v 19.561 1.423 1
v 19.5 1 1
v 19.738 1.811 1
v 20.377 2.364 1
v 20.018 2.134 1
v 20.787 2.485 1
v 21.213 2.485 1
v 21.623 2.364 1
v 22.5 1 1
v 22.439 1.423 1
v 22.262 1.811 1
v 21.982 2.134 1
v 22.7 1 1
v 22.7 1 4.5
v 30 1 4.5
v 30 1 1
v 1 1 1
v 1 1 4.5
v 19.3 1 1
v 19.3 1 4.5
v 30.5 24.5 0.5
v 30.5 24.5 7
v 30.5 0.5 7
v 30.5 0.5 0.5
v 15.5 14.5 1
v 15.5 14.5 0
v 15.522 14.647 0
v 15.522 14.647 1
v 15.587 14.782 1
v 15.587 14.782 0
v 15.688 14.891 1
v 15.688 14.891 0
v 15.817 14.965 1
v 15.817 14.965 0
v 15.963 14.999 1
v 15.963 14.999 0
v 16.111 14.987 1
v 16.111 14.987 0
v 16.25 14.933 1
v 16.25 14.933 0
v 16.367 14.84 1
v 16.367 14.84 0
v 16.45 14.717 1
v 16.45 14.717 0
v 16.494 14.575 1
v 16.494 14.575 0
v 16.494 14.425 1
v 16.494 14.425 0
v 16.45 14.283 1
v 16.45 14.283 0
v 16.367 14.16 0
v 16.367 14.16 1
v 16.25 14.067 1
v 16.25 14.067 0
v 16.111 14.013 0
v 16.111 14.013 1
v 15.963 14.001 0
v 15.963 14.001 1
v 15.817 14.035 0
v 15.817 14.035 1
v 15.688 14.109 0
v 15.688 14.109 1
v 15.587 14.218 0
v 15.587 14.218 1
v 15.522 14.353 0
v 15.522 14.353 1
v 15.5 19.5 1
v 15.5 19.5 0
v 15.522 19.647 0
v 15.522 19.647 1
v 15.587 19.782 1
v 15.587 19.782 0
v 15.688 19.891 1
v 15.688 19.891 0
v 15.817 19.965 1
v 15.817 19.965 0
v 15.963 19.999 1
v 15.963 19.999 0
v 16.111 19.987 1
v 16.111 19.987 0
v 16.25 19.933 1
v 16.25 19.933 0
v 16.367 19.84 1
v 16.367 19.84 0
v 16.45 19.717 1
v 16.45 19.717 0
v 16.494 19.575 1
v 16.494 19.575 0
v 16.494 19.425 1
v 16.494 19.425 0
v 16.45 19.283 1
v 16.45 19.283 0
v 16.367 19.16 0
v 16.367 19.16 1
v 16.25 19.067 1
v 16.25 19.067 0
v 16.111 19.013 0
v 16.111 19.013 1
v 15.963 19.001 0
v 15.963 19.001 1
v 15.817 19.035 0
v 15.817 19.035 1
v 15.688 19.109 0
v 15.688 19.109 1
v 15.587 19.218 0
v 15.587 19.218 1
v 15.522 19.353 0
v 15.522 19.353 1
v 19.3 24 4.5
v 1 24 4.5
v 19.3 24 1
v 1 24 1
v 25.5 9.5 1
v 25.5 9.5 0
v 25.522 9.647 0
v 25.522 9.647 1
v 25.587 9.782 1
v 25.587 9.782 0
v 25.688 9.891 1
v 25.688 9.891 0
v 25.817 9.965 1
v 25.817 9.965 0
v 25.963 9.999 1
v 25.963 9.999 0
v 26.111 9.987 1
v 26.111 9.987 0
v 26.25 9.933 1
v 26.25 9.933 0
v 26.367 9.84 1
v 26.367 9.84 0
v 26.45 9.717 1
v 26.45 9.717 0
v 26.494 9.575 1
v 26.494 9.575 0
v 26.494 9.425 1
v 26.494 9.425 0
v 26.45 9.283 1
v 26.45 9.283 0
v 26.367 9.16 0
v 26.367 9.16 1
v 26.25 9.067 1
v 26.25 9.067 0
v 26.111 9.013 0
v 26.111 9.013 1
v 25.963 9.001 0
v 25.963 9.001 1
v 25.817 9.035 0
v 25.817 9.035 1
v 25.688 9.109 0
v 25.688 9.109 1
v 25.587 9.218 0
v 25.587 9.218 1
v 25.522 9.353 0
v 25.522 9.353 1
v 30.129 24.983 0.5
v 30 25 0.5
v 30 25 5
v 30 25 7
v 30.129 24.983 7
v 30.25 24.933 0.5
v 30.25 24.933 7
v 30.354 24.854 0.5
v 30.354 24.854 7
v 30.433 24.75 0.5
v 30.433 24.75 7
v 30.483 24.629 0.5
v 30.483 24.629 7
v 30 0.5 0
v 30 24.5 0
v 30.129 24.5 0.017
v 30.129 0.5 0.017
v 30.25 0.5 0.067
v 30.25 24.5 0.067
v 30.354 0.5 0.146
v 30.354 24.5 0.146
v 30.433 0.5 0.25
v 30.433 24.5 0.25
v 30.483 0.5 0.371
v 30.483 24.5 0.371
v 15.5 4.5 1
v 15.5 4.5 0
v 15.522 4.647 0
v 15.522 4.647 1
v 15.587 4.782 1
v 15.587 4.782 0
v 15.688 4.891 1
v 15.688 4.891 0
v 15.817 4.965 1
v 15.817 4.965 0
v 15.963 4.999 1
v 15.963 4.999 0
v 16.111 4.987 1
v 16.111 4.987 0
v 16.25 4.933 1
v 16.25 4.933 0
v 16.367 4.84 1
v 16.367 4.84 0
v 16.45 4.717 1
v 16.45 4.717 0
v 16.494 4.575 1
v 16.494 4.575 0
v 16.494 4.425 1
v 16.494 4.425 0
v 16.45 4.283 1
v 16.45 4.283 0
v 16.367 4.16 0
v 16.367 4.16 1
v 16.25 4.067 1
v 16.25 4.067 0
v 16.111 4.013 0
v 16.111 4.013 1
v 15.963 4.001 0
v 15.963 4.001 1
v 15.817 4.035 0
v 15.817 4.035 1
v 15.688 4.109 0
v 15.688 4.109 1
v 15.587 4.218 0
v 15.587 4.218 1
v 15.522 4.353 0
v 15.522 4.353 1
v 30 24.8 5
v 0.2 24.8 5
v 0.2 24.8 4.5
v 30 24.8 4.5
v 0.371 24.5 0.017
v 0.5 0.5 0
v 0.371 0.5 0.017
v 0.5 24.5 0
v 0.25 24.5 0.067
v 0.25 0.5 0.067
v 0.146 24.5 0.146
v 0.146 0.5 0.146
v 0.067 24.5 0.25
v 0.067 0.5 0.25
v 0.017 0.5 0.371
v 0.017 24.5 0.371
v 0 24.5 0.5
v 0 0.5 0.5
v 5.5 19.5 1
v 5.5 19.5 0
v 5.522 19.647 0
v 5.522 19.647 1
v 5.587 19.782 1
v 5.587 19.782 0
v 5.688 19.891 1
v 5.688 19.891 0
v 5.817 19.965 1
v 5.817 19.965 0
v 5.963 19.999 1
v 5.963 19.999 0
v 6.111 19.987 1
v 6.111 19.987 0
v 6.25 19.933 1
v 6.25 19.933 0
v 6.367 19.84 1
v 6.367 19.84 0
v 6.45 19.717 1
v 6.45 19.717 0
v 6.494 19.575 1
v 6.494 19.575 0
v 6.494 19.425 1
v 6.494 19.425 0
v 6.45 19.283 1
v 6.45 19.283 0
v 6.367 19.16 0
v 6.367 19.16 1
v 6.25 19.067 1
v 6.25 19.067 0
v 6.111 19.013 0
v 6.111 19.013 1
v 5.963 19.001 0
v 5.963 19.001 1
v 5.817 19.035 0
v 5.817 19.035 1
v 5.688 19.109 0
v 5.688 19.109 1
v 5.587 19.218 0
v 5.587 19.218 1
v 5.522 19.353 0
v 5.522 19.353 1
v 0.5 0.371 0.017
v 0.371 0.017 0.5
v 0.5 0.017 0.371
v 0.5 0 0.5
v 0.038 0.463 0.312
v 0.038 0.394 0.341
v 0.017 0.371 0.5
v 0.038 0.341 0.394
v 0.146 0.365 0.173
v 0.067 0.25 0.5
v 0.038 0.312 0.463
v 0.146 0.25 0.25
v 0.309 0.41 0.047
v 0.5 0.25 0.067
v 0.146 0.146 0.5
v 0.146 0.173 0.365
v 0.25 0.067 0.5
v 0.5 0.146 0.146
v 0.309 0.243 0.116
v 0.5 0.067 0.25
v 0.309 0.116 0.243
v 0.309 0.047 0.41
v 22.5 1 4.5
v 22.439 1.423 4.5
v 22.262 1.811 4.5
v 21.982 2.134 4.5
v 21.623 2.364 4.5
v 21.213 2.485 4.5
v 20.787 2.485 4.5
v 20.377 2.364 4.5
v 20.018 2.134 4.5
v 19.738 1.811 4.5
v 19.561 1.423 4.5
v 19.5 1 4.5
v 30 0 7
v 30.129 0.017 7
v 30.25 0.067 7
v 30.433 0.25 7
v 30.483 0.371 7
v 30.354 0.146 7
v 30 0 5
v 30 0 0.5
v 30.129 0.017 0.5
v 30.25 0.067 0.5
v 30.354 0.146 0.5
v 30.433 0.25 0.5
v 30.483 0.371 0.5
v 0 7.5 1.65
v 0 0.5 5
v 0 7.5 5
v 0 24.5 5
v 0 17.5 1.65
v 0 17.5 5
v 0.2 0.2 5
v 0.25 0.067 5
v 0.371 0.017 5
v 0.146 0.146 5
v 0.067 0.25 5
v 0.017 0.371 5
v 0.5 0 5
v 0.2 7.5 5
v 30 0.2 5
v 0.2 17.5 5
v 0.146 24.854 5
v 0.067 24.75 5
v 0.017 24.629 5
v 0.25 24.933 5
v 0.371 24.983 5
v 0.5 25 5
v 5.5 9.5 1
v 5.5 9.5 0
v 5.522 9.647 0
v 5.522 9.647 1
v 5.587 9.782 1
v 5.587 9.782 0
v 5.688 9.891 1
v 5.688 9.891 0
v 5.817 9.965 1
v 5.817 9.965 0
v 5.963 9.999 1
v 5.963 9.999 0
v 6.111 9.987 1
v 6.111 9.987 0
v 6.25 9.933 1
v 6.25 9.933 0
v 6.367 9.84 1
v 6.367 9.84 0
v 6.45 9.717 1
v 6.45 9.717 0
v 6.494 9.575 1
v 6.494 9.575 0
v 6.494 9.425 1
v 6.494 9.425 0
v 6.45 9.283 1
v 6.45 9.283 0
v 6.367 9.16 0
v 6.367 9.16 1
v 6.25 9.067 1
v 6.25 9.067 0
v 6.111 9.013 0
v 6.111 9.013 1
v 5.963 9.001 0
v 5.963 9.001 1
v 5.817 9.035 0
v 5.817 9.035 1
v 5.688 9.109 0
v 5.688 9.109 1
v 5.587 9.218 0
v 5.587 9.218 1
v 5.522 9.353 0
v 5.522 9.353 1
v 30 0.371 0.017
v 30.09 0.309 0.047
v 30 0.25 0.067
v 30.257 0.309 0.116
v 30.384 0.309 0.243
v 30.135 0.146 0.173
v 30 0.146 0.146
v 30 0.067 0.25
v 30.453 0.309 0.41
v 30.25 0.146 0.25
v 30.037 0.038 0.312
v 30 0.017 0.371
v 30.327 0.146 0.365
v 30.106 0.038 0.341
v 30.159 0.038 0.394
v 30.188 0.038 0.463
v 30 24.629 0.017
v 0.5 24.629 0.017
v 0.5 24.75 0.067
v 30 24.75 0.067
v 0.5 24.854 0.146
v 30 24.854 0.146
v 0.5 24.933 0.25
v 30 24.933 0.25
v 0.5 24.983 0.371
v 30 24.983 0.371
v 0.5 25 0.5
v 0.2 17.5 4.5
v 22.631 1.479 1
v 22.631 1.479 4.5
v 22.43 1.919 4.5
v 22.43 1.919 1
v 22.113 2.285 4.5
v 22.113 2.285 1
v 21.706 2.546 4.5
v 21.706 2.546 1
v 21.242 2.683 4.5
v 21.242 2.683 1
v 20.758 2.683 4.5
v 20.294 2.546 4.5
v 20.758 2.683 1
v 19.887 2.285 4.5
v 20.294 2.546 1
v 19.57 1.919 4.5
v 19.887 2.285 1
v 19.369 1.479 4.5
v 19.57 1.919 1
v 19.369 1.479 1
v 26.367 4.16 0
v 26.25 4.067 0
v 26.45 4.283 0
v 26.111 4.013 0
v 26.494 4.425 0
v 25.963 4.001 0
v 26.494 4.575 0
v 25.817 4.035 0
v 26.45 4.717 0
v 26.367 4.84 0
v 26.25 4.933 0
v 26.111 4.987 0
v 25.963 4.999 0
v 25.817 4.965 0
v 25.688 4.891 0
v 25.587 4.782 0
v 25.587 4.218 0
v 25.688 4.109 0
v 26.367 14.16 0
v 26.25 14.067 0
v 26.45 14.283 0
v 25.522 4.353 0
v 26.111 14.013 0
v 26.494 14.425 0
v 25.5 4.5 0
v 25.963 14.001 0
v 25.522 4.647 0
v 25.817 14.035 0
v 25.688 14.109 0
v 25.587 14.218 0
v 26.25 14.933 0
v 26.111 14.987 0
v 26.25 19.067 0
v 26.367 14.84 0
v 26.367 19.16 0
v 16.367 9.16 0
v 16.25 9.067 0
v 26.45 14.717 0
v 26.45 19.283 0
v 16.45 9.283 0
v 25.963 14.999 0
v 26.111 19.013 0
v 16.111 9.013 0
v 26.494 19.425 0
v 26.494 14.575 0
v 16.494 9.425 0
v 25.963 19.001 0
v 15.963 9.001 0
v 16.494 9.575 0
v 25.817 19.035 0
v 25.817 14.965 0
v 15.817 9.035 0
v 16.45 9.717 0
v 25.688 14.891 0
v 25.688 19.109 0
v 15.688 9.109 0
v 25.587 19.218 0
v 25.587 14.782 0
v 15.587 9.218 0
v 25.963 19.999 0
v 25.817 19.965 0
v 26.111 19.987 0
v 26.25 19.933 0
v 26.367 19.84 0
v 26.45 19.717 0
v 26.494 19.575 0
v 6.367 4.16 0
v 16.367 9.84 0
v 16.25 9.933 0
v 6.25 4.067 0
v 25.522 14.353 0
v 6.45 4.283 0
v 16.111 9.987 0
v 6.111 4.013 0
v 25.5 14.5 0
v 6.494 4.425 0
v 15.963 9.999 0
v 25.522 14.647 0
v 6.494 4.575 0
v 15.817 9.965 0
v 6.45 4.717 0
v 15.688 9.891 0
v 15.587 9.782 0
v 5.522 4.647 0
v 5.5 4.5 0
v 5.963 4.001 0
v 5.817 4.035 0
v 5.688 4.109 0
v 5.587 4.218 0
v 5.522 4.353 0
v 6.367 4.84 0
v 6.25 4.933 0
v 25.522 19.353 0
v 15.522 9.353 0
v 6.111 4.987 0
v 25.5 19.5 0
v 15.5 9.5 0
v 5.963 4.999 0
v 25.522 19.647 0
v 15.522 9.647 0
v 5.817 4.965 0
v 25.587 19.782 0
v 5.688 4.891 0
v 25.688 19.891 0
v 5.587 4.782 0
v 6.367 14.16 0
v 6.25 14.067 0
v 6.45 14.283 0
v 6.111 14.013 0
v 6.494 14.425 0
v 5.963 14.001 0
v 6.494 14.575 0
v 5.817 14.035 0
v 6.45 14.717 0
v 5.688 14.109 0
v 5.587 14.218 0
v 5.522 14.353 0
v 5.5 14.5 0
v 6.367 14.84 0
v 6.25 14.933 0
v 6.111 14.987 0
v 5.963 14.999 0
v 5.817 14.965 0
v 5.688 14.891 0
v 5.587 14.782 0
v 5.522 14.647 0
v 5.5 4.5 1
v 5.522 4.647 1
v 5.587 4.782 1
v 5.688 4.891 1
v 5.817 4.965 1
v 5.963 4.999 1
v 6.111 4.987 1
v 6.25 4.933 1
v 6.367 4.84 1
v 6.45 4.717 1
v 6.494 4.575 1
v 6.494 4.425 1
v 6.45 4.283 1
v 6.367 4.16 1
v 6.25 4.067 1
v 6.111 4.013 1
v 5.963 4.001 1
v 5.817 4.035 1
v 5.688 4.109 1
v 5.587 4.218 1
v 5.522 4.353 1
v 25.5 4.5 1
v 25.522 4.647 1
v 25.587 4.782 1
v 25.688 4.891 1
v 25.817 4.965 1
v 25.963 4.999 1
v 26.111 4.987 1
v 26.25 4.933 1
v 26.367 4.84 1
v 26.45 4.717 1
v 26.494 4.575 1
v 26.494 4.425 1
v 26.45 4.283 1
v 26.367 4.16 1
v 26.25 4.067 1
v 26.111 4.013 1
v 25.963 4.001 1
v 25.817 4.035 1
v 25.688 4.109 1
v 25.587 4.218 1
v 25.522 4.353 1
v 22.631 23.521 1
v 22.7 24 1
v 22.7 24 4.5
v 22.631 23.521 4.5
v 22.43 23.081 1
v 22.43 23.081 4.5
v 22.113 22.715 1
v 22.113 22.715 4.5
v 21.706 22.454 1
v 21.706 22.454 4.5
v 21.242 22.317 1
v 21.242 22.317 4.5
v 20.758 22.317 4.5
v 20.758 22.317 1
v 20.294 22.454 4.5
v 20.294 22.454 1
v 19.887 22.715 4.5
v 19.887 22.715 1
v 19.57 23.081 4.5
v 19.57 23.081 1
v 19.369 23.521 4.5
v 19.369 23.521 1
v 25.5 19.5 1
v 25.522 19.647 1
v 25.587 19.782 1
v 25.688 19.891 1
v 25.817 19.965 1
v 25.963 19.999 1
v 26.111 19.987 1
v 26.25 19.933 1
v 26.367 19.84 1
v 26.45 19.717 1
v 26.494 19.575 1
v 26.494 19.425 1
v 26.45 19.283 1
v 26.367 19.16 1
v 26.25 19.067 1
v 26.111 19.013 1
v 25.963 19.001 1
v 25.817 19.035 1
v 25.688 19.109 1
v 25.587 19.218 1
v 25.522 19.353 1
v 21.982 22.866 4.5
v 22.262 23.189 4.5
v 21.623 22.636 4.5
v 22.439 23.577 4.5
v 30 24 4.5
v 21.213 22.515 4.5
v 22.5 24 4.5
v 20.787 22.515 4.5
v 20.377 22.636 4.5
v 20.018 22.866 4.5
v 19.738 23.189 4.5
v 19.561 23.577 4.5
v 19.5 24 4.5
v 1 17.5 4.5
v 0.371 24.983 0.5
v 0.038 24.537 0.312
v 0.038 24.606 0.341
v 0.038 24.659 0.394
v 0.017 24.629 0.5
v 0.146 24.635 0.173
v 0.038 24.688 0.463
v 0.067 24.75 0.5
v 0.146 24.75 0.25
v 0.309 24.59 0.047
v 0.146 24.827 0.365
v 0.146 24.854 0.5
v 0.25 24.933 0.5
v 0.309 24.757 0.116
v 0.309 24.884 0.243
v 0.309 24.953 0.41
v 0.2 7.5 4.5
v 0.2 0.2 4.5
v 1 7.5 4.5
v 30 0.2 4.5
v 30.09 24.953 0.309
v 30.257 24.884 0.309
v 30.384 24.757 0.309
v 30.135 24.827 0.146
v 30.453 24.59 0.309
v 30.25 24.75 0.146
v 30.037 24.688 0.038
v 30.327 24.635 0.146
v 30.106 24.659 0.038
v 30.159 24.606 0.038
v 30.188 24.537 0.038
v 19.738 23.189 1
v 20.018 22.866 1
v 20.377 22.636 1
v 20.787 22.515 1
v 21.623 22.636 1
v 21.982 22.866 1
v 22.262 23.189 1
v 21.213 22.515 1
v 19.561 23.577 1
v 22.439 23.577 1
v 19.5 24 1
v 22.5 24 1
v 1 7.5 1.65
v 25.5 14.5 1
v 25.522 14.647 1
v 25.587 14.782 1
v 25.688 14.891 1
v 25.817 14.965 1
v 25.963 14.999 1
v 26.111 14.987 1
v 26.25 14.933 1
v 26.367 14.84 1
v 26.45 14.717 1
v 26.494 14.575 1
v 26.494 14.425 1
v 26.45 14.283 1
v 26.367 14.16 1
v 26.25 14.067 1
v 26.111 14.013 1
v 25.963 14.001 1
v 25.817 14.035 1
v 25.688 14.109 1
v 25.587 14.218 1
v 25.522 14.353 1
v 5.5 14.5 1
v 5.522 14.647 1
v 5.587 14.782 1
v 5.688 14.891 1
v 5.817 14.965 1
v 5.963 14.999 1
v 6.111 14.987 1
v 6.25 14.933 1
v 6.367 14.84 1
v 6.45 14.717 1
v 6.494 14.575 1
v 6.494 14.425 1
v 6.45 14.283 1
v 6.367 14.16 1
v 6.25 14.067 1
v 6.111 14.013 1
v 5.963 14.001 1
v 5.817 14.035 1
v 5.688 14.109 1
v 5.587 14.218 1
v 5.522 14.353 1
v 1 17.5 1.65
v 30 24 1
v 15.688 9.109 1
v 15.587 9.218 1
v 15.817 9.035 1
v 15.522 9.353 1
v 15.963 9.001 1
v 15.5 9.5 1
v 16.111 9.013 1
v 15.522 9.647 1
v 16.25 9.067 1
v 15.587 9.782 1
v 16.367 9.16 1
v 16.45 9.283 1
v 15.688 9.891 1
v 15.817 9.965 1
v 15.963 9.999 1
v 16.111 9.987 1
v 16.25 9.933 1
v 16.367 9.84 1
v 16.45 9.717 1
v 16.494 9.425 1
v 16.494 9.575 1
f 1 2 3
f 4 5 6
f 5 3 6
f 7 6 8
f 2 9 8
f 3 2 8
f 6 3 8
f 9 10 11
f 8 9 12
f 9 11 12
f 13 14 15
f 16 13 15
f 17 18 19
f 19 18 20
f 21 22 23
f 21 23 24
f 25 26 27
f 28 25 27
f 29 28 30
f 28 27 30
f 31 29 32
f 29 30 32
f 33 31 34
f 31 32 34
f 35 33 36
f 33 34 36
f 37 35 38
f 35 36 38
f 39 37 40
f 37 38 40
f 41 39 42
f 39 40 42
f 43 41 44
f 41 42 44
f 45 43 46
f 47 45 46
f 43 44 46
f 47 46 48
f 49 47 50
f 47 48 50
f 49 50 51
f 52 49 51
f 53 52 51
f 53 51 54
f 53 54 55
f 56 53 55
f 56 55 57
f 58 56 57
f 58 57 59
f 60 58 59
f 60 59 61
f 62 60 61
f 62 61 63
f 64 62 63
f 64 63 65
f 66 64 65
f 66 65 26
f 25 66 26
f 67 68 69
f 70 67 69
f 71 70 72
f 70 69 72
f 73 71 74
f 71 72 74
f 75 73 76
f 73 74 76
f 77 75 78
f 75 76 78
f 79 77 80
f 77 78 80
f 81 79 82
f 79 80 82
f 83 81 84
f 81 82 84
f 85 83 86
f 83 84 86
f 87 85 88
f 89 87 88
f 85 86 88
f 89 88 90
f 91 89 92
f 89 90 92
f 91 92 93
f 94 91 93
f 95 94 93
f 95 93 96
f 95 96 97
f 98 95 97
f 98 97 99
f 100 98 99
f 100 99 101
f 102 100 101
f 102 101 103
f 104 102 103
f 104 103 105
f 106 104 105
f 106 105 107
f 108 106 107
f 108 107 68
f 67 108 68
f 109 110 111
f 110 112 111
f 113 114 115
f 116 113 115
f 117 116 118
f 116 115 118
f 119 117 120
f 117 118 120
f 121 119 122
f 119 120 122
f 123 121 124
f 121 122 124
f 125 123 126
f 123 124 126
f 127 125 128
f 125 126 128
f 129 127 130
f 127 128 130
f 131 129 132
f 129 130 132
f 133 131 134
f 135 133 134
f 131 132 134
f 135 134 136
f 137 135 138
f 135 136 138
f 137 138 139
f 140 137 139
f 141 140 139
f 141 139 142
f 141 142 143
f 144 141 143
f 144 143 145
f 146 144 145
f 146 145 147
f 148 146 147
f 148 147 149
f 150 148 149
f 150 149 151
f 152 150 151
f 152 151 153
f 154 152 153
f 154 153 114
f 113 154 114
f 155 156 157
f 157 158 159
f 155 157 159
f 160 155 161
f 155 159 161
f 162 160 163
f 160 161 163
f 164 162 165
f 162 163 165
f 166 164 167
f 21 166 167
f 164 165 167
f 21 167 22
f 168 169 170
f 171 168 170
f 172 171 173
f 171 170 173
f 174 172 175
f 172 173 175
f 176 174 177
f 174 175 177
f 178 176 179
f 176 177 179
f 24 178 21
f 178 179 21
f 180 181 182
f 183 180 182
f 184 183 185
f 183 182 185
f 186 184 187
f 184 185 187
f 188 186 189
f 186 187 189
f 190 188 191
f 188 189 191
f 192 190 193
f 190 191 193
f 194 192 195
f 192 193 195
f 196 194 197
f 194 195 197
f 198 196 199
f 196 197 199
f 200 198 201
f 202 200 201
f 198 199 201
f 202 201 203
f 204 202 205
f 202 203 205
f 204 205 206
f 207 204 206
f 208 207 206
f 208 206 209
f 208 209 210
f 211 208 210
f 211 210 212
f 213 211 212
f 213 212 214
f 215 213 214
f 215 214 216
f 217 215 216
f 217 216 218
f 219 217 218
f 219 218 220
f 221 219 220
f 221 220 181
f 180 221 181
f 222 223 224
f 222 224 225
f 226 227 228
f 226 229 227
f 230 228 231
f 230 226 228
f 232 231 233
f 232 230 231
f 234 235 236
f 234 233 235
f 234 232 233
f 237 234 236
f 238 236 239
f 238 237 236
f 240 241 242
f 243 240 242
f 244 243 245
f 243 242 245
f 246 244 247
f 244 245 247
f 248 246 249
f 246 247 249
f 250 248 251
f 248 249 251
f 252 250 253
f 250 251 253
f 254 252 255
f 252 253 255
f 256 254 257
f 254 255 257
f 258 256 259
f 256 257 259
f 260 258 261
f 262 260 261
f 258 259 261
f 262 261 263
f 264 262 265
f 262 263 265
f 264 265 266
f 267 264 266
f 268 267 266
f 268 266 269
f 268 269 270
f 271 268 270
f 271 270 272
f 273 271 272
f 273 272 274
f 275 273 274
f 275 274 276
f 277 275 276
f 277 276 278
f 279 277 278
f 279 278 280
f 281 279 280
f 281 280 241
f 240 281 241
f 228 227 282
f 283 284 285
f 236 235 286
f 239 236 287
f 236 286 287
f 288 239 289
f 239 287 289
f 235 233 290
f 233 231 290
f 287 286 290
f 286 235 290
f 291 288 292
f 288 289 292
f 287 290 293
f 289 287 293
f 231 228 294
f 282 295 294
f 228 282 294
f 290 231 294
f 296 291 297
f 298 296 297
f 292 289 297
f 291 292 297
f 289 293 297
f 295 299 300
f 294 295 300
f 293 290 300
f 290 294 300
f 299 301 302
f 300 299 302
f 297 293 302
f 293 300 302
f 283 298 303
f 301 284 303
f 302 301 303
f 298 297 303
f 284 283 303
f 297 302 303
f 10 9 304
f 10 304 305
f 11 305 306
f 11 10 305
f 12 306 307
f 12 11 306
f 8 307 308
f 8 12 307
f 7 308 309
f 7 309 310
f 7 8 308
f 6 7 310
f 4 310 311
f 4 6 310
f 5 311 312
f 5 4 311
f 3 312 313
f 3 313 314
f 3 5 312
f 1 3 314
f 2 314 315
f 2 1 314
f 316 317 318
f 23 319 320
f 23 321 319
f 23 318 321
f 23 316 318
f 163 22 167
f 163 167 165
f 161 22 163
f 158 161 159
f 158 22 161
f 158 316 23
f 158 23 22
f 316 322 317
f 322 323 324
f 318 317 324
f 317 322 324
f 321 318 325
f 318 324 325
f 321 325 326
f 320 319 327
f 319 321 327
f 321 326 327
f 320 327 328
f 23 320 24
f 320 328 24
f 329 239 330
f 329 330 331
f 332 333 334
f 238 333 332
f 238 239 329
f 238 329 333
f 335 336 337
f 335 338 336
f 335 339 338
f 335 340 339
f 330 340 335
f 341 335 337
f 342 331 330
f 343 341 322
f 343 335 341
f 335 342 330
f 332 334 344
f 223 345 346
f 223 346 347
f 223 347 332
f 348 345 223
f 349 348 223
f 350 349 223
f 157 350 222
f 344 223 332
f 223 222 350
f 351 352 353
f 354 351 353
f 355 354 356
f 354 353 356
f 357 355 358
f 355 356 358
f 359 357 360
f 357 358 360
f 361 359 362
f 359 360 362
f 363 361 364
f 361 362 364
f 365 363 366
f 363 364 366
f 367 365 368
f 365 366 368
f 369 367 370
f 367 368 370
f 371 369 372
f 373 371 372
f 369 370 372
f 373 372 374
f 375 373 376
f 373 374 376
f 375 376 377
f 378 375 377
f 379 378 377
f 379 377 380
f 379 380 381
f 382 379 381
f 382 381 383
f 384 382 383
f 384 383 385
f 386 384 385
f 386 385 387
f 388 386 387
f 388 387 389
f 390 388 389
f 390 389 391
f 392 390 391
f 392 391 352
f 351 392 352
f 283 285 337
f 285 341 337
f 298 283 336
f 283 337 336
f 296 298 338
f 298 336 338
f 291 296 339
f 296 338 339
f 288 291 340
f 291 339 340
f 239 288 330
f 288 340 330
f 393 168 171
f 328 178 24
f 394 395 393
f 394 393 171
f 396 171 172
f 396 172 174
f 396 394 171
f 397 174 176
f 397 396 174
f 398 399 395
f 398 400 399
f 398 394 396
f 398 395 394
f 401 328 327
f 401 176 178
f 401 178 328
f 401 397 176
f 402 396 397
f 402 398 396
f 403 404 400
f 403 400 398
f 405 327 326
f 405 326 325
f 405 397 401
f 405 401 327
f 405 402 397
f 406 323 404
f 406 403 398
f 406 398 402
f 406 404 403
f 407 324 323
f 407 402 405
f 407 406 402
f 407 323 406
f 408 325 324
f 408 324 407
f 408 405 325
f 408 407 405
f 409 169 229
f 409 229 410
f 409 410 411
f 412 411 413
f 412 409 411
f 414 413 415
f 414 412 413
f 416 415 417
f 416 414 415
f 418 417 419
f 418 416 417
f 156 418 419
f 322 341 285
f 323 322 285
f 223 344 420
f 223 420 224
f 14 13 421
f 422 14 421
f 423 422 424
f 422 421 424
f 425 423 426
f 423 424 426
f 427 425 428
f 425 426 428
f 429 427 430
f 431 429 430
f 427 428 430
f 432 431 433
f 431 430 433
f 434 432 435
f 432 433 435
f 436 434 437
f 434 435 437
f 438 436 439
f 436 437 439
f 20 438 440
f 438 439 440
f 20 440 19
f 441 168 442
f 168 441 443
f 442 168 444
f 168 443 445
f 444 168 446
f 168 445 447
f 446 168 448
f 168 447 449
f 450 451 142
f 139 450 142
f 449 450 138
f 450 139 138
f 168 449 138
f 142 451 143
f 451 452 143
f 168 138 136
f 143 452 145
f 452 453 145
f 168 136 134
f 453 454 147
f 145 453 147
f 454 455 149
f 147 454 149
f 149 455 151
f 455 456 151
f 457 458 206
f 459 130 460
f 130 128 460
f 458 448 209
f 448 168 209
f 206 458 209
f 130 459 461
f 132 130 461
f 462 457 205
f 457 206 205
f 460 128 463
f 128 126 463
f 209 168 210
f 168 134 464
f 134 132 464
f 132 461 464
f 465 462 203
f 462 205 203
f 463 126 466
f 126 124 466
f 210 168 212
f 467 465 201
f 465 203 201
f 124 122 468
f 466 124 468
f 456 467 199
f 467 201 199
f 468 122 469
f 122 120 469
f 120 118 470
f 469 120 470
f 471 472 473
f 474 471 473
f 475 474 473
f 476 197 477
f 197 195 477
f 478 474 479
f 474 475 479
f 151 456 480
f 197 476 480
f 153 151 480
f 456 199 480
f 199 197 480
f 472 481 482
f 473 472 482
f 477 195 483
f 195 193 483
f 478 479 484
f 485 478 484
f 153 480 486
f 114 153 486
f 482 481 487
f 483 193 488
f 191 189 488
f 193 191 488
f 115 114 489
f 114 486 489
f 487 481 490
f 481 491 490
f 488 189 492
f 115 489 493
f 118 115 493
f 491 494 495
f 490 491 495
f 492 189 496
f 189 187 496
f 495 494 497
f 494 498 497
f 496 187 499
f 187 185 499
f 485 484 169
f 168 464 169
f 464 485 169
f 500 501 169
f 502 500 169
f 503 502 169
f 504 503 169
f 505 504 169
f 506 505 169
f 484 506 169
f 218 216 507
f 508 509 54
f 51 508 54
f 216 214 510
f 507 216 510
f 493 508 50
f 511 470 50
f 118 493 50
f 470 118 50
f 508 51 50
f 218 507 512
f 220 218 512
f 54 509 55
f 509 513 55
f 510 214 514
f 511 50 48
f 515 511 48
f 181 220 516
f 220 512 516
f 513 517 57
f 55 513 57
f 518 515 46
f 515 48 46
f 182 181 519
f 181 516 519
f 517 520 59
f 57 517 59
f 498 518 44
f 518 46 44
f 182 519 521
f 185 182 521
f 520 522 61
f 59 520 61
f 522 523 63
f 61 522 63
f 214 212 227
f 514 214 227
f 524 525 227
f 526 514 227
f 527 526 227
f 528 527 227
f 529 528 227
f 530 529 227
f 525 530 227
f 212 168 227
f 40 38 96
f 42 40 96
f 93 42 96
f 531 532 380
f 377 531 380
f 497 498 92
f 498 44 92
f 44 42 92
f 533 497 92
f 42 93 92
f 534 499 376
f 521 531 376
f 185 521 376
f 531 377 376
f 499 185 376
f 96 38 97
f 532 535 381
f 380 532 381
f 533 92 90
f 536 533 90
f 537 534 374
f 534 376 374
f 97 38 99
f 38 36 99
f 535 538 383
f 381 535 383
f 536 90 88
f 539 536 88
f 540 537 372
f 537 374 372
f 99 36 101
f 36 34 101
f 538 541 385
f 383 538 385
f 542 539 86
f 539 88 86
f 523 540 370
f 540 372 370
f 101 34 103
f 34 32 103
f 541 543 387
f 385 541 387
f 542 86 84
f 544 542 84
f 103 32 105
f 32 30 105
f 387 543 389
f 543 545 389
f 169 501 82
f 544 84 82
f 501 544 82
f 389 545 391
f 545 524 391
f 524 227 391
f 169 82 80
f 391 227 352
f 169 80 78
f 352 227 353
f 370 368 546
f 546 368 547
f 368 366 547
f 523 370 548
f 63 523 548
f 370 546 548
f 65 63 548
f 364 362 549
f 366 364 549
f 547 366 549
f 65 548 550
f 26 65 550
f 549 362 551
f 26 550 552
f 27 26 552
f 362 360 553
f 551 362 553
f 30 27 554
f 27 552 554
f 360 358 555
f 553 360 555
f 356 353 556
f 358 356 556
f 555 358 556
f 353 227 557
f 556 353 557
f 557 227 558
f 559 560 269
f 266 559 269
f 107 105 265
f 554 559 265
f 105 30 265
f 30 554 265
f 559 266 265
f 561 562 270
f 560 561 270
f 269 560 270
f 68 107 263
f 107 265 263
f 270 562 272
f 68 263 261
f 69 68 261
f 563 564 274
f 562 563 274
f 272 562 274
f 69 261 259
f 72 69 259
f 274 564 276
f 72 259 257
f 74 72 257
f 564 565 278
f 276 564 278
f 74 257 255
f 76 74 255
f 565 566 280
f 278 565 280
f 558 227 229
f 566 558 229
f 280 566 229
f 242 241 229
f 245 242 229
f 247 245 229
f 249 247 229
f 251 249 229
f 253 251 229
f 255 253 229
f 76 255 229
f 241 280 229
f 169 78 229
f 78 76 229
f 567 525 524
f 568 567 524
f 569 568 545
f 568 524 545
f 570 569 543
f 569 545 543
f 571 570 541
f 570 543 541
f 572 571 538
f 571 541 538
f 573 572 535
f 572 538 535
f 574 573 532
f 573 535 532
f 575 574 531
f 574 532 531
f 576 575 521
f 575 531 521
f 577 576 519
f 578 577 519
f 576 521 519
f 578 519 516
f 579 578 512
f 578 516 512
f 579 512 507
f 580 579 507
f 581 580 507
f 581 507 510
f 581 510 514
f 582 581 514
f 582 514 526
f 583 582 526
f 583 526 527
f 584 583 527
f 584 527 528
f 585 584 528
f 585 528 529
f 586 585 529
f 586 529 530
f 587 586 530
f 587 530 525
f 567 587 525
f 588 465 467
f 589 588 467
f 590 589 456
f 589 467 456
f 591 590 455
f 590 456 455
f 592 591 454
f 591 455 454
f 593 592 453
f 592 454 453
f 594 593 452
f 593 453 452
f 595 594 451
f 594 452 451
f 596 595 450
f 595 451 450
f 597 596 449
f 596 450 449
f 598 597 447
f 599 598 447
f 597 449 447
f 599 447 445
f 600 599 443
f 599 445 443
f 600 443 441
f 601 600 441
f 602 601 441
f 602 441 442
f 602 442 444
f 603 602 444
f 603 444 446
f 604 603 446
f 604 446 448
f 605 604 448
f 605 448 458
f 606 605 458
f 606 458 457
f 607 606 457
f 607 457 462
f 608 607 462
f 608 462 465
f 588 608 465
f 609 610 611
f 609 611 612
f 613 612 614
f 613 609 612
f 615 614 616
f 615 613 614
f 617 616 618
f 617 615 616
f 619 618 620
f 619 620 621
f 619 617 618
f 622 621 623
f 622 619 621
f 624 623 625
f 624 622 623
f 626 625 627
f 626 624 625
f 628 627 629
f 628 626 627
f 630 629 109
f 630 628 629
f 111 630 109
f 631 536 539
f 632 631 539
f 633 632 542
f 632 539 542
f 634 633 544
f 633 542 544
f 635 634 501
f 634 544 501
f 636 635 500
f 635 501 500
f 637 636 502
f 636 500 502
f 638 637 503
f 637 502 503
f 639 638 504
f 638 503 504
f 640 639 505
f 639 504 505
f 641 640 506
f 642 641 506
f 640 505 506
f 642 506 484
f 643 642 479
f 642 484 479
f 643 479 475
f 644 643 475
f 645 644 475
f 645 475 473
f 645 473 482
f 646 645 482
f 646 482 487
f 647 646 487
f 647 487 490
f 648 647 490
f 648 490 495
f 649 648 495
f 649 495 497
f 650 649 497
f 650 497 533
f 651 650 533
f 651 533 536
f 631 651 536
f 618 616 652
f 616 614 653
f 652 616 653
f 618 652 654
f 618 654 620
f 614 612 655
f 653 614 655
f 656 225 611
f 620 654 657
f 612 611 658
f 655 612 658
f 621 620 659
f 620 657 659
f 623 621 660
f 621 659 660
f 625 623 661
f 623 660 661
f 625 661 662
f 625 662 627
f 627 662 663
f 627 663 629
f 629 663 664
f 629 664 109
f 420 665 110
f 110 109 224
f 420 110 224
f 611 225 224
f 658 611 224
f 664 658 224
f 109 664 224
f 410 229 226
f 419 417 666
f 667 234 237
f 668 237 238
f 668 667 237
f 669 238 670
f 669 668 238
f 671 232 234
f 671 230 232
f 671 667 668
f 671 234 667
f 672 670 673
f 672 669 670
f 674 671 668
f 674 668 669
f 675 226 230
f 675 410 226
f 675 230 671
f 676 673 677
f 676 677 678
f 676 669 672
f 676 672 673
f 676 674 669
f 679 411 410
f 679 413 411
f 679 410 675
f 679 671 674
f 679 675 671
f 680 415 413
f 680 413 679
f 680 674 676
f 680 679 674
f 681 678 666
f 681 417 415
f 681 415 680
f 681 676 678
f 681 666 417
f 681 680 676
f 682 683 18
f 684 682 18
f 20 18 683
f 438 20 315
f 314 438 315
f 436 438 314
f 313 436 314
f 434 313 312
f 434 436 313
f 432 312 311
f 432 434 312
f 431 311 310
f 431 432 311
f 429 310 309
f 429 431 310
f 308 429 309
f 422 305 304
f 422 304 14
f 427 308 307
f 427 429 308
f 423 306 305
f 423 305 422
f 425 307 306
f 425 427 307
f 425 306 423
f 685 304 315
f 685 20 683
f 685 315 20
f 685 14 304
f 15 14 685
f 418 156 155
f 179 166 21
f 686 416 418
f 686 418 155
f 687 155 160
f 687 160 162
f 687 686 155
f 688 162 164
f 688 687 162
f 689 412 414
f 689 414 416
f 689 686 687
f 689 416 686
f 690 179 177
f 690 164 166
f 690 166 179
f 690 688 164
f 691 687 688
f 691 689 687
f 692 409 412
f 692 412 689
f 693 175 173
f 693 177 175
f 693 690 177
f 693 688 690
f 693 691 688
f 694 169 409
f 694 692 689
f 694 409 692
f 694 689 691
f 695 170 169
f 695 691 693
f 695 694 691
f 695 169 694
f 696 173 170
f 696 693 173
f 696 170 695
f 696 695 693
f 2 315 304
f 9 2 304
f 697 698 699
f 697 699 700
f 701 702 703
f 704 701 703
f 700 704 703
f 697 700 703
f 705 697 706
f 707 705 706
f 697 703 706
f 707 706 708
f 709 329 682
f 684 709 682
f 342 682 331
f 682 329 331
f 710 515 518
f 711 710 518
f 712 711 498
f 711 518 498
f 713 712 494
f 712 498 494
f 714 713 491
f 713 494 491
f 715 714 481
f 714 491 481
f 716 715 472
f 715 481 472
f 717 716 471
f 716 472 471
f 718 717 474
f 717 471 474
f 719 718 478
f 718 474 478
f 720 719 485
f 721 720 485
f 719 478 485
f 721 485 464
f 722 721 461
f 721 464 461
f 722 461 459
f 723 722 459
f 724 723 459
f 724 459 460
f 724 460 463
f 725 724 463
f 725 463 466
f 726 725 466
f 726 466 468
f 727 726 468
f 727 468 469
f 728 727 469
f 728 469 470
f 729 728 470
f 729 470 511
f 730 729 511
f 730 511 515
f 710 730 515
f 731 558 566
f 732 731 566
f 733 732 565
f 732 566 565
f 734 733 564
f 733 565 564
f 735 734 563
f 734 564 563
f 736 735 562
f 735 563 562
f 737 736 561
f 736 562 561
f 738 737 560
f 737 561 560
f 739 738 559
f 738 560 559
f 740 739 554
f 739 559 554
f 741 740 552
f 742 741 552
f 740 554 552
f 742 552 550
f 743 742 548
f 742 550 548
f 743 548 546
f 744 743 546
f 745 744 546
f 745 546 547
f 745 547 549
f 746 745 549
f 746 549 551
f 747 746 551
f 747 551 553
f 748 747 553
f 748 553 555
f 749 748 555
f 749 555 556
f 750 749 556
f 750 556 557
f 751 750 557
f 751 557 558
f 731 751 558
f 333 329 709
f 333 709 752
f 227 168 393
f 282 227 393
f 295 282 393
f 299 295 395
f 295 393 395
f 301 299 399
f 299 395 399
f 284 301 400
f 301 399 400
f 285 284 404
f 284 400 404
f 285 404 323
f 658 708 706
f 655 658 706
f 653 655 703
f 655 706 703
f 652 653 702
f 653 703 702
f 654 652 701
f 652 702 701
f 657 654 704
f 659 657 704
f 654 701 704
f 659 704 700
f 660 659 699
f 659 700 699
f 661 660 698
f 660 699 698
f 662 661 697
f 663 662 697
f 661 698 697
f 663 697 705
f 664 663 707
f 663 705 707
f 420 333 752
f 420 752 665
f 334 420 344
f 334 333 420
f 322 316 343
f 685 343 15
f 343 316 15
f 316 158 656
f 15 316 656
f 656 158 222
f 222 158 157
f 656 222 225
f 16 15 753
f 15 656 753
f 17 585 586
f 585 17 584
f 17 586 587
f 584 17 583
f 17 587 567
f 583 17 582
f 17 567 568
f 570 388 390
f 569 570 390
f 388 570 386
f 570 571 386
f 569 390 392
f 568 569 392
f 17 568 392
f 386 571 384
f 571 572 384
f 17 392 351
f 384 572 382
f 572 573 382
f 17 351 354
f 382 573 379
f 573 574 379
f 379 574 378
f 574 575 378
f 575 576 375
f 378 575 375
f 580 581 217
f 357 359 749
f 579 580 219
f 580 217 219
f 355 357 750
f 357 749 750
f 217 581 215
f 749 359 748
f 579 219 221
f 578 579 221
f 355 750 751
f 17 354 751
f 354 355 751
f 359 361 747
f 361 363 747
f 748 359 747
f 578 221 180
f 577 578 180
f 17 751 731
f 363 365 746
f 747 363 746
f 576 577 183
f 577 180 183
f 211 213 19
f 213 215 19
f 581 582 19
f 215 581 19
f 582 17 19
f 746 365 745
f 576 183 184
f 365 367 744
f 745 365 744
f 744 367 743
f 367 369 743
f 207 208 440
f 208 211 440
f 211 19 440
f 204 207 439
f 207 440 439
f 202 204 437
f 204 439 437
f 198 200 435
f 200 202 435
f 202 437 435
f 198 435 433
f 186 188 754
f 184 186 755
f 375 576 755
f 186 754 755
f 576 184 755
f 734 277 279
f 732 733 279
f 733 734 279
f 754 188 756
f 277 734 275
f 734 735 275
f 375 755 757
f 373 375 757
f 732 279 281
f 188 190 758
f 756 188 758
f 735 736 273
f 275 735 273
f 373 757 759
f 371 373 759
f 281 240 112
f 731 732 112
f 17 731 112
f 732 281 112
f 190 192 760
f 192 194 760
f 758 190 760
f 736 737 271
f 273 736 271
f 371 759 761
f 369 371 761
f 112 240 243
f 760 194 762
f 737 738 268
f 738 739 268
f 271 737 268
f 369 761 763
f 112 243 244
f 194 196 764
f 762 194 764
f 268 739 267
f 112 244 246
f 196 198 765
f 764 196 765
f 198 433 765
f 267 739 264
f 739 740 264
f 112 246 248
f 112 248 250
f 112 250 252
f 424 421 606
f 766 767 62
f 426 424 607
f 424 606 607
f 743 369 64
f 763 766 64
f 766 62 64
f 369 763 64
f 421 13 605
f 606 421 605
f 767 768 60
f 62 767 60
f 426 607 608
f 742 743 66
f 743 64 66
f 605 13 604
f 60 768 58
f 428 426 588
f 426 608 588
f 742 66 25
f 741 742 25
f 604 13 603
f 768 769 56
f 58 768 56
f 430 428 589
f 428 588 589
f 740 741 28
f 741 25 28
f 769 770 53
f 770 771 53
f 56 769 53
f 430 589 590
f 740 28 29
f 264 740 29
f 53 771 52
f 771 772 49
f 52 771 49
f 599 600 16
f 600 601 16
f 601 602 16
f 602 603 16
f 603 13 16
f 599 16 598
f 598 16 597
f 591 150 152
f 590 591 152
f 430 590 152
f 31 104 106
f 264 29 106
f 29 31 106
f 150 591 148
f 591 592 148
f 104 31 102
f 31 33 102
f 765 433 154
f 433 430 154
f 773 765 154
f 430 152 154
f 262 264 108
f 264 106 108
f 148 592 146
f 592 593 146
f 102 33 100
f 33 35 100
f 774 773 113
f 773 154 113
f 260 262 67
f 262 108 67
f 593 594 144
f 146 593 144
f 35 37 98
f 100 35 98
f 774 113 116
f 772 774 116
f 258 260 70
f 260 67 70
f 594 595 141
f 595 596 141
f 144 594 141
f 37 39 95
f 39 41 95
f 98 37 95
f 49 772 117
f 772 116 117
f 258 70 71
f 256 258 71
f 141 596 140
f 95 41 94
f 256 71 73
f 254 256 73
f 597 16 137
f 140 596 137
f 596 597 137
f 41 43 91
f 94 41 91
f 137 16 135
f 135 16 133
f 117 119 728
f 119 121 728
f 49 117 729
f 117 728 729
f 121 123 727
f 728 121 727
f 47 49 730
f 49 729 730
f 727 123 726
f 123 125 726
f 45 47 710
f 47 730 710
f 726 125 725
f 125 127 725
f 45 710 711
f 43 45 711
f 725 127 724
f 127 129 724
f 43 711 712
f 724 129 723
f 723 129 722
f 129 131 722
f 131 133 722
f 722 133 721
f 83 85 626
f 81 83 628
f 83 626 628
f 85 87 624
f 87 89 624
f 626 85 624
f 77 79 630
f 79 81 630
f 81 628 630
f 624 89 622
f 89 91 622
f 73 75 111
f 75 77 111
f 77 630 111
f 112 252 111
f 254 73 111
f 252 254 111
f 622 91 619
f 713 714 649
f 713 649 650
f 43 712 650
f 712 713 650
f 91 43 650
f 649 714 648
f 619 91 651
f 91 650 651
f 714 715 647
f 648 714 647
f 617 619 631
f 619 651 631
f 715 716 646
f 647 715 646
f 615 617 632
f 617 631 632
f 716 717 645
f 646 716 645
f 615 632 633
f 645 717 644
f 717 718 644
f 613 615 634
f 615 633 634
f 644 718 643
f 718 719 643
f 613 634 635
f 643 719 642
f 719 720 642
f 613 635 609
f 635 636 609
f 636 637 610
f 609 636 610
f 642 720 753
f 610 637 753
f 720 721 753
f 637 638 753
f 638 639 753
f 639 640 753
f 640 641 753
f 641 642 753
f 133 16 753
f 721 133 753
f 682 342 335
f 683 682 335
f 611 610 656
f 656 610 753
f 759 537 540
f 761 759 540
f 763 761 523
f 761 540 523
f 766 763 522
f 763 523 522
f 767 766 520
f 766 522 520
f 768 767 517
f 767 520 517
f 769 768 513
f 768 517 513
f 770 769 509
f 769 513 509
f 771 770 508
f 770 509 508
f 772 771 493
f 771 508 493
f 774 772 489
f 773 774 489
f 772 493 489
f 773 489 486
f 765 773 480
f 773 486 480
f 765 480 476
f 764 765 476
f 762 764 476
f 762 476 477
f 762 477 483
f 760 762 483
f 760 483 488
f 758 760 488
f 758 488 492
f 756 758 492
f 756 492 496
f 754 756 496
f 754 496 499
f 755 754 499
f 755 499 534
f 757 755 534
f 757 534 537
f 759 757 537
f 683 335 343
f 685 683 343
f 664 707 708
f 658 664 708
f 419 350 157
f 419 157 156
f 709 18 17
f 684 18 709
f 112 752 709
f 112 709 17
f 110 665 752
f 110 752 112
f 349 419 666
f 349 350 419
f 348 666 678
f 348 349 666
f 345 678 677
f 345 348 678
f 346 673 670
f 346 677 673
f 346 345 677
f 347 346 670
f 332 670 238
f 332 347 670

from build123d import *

# Parameters (mm, degrees)
ESQUISSE1_W             = 30
ESQUISSE1_H             = 25
BOSS_EXTRU_1_DEPTH      = 5
ESQUISSE2_W             = 28
ESQUISSE2_H             = 23
ENL_V_MAT_EXTRU_1_DEPTH = 4
ESQUISSE3_W             = 3.35
ESQUISSE3_H             = 10
ENL_V_MAT_EXTRU_2_DEPTH = 10
ESQUISSE4_W             = 4
ESQUISSE4_H             = 23
ENL_V_MAT_EXTRU_3_DEPTH = 10
BOSS_EXTRU_2_DEPTH      = 3.5
CONG_3_R                = 0.5
ENL_V_MAT_EXTRU_6_DEPTH = 0.5
ESQUISSE12_W            = 7
ESQUISSE12_H            = 25
BOSS_EXTRU_5_DEPTH      = 0.5
CONG_5_R                = 0.5
ESQUISSE13_R            = 0.5
ENL_V_MAT_EXTRU_8_DEPTH = 10.5


with BuildPart() as part:
    # Esquisse1 → Boss.-Extru.1 (new body)
    with BuildSketch(Plane.XY):
        with Locations((15, 12.5)):
            Rectangle(ESQUISSE1_W, ESQUISSE1_H)
    extrude(amount=BOSS_EXTRU_1_DEPTH)

    # Esquisse2 → Enlèv. mat.-Extru.1 (cut)
    with BuildSketch(Plane.XY.offset(5)):
        with Locations((15, 12.5)):
            Rectangle(ESQUISSE2_W, ESQUISSE2_H)
    extrude(amount=-ENL_V_MAT_EXTRU_1_DEPTH, mode=Mode.SUBTRACT)

    # Esquisse3 → Enlèv. mat.-Extru.2 (cut)
    with BuildSketch(Plane.ZY):
        with Locations((3.325, 12.5)):
            Rectangle(ESQUISSE3_W, ESQUISSE3_H)
    extrude(amount=-ENL_V_MAT_EXTRU_2_DEPTH, mode=Mode.SUBTRACT)

    # Esquisse4 → Enlèv. mat.-Extru.3 (cut)
    with BuildSketch(Plane(origin=(30, 0, 0), x_dir=(0, 0, -1), z_dir=(1, 0, 0))):
        with Locations((-3, 12.5)):
            Rectangle(ESQUISSE4_W, ESQUISSE4_H)
    extrude(amount=-ENL_V_MAT_EXTRU_3_DEPTH, mode=Mode.SUBTRACT)

    # Esquisse5 → Boss.-Extru.2 (add)
    # profile 1 of 2: a face of its own
    with BuildSketch(Plane.XY.offset(1)):
        with BuildLine():
            Line((19.311805698, 24.2), (22.688194302, 24.2))
            ThreePointArc((22.688194302, 24.2), (21, 22.3), (19.311805698, 24.2))
        make_face()
        with BuildLine():
            Line((19.5, 24), (22.5, 24))
            ThreePointArc((22.5, 24), (21, 22.5), (19.5, 24))
        make_face(mode=Mode.SUBTRACT)
    # profile 2 of 2: a face of its own
    with BuildSketch(Plane.XY.offset(1)):
        with BuildLine():
            Line((19.311805698, 0.8), (22.688194302, 0.8))
            ThreePointArc((22.688194302, 0.8), (21, 2.7), (19.311805698, 0.8))
        make_face()
        with BuildLine():
            Line((19.5, 1), (22.5, 1))
            ThreePointArc((22.5, 1), (21, 2.5), (19.5, 1))
        make_face(mode=Mode.SUBTRACT)
    extrude(amount=BOSS_EXTRU_2_DEPTH)

    # Congé3
    cong_3_edges = [part.edges().sort_by_distance(p)[0] for p in [
        (15, 25, 0),
        (15, 0, 0),
        (0, 12.5, 0),
        (0, 25, 2.5),
        (0, 0, 2.5),
    ]]
    fillet(cong_3_edges, radius=CONG_3_R)

    # Esquisse9 → Enlèv. mat.-Extru.6 (cut)
    with BuildSketch(Plane.XY.offset(5)):
        Polygon((0.2, 7.5), (0.2, 0.2), (30, 0.2), (30, 1), (1, 1), (1, 7.5), align=None)
        Polygon((1, 17.5), (0.2, 17.5), (0.2, 24.8), (30, 24.8), (30, 24), (1, 24), align=None)
    extrude(amount=-ENL_V_MAT_EXTRU_6_DEPTH, mode=Mode.SUBTRACT)

    # Esquisse12 → Boss.-Extru.5 (add)
    with BuildSketch(Plane(origin=(30, 0, 0), x_dir=(0, 0, -1), z_dir=(1, 0, 0))):
        with Locations((-3.5, 12.5)):
            Rectangle(ESQUISSE12_W, ESQUISSE12_H)
    extrude(amount=BOSS_EXTRU_5_DEPTH)

    # Congé5
    # the kernel refuses this fillet: 0.5 mm, written as the material it takes off along each edge
    with BuildSketch(Plane(origin=(30, 0.5, 0.5), x_dir=(0, 0, -1), z_dir=(0, -1, 0))) as cong_5_piece_1_section:
        Polygon((0, 0), (CONG_5_R * 1.02, 0), (CONG_5_R * 1.02, CONG_5_R * 1.02), (0, CONG_5_R * 1.02), align=None)
    cong_5_piece_1 = extrude(amount=CONG_5_R * 1.02, mode=Mode.PRIVATE)
    cong_5_piece_1 = cong_5_piece_1 - Plane(origin=(30, 0.5, 0.5), x_dir=(-0.7071067811865475, 0, 0.7071067811865475), z_dir=(0, -1, 0)) * Sphere(CONG_5_R, mode=Mode.PRIVATE)
    add(cong_5_piece_1, mode=Mode.SUBTRACT)
    with BuildSketch(Plane(origin=(30, 24.5, 0.5), x_dir=(1, 0, 0), z_dir=(0, 0, -1))) as cong_5_piece_2_section:
        Polygon((0, 0), (CONG_5_R * 1.02, 0), (CONG_5_R * 1.02, -CONG_5_R * 1.02), (0, -CONG_5_R * 1.02), align=None)
    cong_5_piece_2 = extrude(amount=CONG_5_R * 1.02, mode=Mode.PRIVATE)
    cong_5_piece_2 = cong_5_piece_2 - Plane(origin=(30, 24.5, 0.5), x_dir=(-0.7071067811865475, -0.7071067811865475, 0), z_dir=(0, 0, -1)) * Sphere(CONG_5_R, mode=Mode.PRIVATE)
    add(cong_5_piece_2, mode=Mode.SUBTRACT)
    with BuildSketch(Plane(origin=(30.5, 24.5, 0), x_dir=(-1, 0, 0), z_dir=(0, -1, 0))) as cong_5_piece_3:
        with BuildLine():
            CenterArc((CONG_5_R, -CONG_5_R), CONG_5_R, 90, 90)
            Line((0, -CONG_5_R), (0, 0))
            Line((0, 0), (CONG_5_R, 0))
        make_face()
    extrude(amount=24, mode=Mode.SUBTRACT)
    with BuildSketch(Plane(origin=(30.5, 25, 8.25), x_dir=(0, -1, 0), z_dir=(0, 0, -1))) as cong_5_piece_4:
        with BuildLine():
            CenterArc((CONG_5_R, CONG_5_R), CONG_5_R, 180, 90)
            Line((0, CONG_5_R), (0, 0))
            Line((0, 0), (CONG_5_R, 0))
        make_face()
    extrude(amount=7.75, mode=Mode.SUBTRACT)
    with BuildSketch(Plane(origin=(30.5, 0, 0.5), x_dir=(-1, 0, 0), z_dir=(0, 0, 1))) as cong_5_piece_5:
        with BuildLine():
            CenterArc((CONG_5_R, -CONG_5_R), CONG_5_R, 90, 90)
            Line((0, -CONG_5_R), (0, 0))
            Line((0, 0), (CONG_5_R, 0))
        make_face()
    extrude(amount=7.75, mode=Mode.SUBTRACT)

    # Esquisse13 → Enlèv. mat.-Extru.8 (cut)
    with BuildSketch(Plane(origin=(0, 0, 0), x_dir=(-1, 0, 0), z_dir=(0, 0, -1))):
        with Locations((-26, 19.5)):
            Circle(ESQUISSE13_R)
        with Locations((-16, 19.5)):
            Circle(ESQUISSE13_R)
        with Locations((-6, 19.5)):
            Circle(ESQUISSE13_R)
        with Locations((-16, 14.5)):
            Circle(ESQUISSE13_R)
        with Locations((-6, 14.5)):
            Circle(ESQUISSE13_R)
        with Locations((-16, 9.5)):
            Circle(ESQUISSE13_R)
        with Locations((-6, 9.5)):
            Circle(ESQUISSE13_R)
        with Locations((-16, 4.5)):
            Circle(ESQUISSE13_R)
        with Locations((-6, 4.5)):
            Circle(ESQUISSE13_R)
        with Locations((-26, 14.5)):
            Circle(ESQUISSE13_R)
        with Locations((-26, 9.5)):
            Circle(ESQUISSE13_R)
        with Locations((-26, 4.5)):
            Circle(ESQUISSE13_R)
    extrude(amount=-ENL_V_MAT_EXTRU_8_DEPTH, mode=Mode.SUBTRACT)


solid = part.part
